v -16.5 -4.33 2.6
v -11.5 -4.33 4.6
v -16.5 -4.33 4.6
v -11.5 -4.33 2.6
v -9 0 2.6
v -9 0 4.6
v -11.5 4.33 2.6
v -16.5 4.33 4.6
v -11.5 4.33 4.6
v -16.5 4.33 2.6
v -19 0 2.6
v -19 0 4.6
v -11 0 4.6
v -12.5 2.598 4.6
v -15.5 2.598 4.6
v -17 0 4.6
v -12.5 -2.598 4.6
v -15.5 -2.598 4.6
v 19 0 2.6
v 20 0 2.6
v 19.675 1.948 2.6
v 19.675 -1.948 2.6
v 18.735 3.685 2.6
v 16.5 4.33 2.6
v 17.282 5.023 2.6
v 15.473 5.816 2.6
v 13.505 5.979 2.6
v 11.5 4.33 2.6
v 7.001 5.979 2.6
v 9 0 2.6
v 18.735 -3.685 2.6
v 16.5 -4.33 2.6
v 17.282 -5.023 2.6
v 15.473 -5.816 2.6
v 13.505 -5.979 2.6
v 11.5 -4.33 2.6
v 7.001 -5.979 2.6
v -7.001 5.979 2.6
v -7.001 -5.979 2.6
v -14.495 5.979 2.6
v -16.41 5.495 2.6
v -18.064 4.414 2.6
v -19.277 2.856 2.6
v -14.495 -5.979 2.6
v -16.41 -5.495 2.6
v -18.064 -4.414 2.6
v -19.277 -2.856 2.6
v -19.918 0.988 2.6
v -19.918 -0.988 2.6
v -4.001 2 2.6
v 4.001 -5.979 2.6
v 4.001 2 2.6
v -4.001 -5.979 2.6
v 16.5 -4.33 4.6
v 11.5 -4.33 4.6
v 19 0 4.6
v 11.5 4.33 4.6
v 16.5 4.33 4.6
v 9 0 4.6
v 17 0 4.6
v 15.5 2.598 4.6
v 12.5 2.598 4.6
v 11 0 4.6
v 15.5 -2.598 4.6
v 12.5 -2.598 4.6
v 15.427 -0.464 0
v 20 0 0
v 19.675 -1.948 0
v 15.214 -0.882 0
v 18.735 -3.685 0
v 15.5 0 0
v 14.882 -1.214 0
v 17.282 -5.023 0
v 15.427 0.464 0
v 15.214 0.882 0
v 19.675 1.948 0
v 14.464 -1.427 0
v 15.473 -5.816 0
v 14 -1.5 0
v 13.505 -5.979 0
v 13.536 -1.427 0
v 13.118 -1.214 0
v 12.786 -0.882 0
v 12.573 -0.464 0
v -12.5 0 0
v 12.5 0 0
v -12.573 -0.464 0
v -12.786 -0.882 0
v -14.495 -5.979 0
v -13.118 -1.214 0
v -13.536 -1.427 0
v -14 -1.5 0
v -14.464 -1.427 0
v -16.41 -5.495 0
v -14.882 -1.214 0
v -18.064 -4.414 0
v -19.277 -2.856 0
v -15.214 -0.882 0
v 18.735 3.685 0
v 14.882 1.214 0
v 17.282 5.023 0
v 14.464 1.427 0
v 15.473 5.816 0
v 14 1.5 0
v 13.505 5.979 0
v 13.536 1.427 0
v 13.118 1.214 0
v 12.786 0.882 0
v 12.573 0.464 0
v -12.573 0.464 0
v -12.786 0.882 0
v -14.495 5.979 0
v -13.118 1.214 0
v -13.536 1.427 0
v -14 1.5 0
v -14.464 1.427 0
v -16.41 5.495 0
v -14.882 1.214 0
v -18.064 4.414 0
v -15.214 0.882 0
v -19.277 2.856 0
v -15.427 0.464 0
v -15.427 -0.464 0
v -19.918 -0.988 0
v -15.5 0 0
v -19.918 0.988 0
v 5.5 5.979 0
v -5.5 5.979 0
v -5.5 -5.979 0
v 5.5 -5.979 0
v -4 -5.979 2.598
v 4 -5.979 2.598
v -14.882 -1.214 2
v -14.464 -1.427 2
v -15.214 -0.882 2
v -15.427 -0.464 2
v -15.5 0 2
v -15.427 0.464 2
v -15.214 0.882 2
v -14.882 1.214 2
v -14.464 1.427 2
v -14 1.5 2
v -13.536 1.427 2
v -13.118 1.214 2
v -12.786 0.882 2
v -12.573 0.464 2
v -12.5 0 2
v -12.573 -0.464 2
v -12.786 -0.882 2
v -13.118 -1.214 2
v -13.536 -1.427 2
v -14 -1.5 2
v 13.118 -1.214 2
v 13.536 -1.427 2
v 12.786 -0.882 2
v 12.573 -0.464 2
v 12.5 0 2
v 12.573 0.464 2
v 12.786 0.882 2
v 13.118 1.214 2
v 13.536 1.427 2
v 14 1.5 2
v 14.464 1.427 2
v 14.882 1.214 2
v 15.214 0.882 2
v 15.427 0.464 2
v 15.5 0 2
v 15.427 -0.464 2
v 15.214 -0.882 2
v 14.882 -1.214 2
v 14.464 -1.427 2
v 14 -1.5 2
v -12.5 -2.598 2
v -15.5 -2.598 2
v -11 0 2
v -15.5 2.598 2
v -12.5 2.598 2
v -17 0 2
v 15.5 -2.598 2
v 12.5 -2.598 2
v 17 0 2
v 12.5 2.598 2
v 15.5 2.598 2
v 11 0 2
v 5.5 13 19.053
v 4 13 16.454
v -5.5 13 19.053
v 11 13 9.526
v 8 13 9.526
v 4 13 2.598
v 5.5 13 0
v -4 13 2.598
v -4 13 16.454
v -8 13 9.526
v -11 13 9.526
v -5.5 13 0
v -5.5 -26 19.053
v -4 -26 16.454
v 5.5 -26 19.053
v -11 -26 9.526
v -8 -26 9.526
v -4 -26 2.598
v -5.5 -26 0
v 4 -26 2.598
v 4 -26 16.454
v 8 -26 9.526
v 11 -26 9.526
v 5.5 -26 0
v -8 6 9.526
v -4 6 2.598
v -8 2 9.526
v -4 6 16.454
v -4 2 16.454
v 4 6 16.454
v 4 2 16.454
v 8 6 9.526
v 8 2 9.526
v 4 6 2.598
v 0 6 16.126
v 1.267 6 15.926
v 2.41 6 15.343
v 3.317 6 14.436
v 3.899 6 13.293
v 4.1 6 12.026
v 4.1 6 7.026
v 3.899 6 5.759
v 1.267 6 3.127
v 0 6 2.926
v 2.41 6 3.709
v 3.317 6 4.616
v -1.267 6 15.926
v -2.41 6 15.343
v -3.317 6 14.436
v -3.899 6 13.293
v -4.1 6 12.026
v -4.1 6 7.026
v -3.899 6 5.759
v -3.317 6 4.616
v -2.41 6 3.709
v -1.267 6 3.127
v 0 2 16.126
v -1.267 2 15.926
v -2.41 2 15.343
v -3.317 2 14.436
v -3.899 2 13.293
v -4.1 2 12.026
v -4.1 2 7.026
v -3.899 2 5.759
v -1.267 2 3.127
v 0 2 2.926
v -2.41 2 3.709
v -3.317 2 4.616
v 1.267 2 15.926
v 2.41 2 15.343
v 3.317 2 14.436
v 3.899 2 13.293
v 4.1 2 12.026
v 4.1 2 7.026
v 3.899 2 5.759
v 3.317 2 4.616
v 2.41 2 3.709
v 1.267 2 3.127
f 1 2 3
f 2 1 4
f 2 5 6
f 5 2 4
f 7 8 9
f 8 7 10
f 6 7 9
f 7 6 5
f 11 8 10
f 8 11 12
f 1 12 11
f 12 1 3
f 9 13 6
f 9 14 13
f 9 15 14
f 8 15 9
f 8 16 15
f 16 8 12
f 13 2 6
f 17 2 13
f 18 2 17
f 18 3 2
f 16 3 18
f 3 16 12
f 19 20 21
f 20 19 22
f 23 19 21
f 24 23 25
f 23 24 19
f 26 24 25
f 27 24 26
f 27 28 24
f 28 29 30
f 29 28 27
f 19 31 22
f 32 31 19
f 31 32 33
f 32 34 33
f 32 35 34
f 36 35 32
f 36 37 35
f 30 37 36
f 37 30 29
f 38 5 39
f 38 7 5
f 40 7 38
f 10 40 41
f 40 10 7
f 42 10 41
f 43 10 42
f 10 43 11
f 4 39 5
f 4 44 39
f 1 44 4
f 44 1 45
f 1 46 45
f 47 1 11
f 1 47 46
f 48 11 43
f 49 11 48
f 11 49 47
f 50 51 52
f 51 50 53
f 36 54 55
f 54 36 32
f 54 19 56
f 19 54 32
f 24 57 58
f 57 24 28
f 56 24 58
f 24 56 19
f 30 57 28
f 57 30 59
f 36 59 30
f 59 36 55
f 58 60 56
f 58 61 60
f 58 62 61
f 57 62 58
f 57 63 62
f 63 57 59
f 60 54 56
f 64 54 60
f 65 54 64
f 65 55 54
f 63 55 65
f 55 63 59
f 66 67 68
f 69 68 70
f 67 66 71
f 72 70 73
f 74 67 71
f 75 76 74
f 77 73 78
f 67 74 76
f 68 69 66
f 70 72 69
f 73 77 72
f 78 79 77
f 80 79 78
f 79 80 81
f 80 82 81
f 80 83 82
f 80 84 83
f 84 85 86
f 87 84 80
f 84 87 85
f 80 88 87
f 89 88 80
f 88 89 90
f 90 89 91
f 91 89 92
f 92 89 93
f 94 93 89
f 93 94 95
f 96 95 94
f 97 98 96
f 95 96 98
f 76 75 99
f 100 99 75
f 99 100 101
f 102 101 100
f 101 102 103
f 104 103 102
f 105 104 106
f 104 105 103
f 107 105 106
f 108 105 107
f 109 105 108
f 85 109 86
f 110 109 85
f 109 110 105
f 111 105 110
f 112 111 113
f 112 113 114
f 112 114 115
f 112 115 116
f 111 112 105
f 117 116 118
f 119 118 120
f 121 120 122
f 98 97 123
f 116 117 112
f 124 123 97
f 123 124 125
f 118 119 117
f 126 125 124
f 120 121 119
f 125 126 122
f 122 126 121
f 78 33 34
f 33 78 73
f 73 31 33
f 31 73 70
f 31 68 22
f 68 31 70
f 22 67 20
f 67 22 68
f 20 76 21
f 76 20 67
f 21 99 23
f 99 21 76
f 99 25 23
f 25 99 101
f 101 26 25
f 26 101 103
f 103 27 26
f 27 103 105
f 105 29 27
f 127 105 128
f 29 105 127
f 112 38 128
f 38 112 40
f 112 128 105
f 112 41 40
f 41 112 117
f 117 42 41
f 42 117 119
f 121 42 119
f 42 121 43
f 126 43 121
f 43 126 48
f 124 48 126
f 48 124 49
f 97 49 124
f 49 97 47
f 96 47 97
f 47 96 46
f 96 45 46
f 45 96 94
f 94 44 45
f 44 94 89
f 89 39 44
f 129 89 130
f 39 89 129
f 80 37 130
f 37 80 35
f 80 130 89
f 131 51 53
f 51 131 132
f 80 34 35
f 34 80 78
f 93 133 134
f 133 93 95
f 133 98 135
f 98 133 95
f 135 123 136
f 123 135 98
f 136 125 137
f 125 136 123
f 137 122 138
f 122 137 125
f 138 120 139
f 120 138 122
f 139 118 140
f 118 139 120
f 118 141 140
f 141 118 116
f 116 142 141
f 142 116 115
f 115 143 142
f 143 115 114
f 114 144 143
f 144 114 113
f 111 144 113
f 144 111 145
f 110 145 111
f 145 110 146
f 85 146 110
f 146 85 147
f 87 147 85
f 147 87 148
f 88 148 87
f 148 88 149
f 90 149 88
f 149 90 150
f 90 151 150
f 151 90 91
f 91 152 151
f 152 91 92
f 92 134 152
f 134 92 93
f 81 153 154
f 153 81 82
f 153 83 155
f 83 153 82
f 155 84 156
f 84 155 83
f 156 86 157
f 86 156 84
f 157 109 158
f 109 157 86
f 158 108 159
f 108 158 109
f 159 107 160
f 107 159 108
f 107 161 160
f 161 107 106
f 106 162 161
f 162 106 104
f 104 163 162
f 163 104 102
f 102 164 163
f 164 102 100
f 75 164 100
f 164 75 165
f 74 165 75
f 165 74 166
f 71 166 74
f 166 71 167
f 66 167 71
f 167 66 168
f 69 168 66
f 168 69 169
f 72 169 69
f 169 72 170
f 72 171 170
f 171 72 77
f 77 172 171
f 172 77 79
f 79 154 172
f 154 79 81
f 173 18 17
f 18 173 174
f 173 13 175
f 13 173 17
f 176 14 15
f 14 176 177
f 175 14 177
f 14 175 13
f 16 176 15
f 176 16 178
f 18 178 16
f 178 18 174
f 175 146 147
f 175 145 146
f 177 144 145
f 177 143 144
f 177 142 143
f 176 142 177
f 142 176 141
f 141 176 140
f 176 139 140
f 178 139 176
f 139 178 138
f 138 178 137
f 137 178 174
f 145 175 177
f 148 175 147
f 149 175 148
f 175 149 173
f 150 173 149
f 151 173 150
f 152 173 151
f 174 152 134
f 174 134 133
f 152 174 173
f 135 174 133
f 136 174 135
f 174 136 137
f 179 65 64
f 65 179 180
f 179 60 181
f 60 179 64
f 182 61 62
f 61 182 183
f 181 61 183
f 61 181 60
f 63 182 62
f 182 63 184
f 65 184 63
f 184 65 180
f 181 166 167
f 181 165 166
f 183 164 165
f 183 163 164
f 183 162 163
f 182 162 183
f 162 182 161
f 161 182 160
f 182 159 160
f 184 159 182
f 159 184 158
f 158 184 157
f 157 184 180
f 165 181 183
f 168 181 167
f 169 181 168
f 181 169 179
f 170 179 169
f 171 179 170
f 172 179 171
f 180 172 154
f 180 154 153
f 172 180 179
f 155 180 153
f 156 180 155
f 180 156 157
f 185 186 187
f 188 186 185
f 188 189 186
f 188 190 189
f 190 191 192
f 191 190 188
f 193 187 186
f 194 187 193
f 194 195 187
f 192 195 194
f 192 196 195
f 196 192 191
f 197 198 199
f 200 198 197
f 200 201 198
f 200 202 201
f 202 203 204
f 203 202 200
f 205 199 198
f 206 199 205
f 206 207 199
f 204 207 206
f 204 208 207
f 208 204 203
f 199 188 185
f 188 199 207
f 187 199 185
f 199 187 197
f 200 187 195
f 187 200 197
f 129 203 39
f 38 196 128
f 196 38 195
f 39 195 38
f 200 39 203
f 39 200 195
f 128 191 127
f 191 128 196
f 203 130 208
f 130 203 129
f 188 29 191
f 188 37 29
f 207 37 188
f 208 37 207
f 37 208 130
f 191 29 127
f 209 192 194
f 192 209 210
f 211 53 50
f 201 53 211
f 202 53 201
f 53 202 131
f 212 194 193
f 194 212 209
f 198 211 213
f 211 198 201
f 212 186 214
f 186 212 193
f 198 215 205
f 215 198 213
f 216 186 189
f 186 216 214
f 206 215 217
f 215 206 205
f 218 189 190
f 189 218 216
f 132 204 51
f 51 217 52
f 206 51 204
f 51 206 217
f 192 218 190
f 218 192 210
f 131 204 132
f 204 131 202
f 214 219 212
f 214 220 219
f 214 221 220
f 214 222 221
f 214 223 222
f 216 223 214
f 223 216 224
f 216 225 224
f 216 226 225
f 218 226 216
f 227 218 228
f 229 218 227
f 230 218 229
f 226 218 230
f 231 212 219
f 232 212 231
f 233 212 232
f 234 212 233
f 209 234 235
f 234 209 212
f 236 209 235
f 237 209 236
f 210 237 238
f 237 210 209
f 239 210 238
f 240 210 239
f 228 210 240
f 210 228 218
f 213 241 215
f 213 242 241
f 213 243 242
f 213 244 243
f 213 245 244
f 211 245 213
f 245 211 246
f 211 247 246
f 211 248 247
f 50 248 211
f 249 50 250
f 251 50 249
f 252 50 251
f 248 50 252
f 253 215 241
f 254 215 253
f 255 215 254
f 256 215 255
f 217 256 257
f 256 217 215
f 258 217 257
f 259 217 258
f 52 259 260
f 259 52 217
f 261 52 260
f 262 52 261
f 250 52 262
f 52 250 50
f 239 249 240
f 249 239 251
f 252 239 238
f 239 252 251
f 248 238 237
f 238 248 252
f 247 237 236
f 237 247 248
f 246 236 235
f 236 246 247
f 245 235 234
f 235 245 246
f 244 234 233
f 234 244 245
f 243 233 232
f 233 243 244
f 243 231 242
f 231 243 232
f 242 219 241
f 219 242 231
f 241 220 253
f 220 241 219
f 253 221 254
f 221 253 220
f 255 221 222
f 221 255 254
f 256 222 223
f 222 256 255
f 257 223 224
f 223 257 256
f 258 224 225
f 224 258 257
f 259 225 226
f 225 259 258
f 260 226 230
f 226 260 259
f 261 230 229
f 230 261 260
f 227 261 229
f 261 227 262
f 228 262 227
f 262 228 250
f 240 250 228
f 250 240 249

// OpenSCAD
// file: ZLink-params.scad
dx_z_threaded = 14;
ZLink_rod_height = 11*sqrt(3)/2;
Zlink_hole_height = (XPlatform_height-thickness)/3;
// file: Metamaquina-config.scad
/*Thickness of acrylic or plywood sheets to use.*/
thickness = 6; //millimiters

/*This value is added to the thickness value when drawing cuts for connecting perpendicular sheets together*/
slot_extra_thickness = 0.5;

module TSlot_holes(width=50){
  t_slot_holes(width=width, thickness=thickness+slot_extra_thickness);
}

module TSlot_joints(width=50){
  t_slot_joints(width=width, thickness=thickness, joint_size=5);
}

/*z motor placement in the original Prusa was on top. Our design uses the z motors in the bottom of the machine, but if you want them on top, you can set this variable to true. */
zmotors_on_top = false;

/* Desired build volume: */
BuildVolume_X=200;
BuildVolume_Y=200;
BuildVolume_Z=150;

//rendering configs:
preview_lasercut=true;
preview_pcb=true;
preview_ABS=true;
preview_PLA=true;
preview_metal=true;
preview_threaded_metal=true;
preview_rubber=true;
preview_nozzle=true;
preview_peek=true;
preview_powersupply=true;

render_calibration_guide = false;
render_build_volume=false;
render_xplatform=true;
render_bolts = false; //work-in-progress

//Colors
rubber_color = [0.1, 0.1, 0.1];
nozzle_color = "gold";
pcb_color = [1.0, 0.0, 0.0];
threaded_metal_color = [0.6, 0.6, 0.6];
metal_color = [0.7, 0.7, 0.7];
powersupply_color = metal_color;
PLA_color = [0.95, 0.35, 0.35];
ABS_color = [0.95, 0.95, 0.85];
//sheet_color = [0.95, 0.8, 0.65];
sheet_color = [0.9, 0.3, 0.3, 1];
peek_color = "beige";
dark_grey = [0.3, 0.3, 0.3];

epsilon=0.1;
inch=25.4;
m3_diameter = 3;
m4_diameter = 4;
m8_diameter = 8;

//-------------------------
//RepRap standards:

X_rods_distance = 50;
X_rods_diameter=8;
z_rod_z_bar_distance = 30;
Y_rods_distance = 140;

//-------------------------
extruder_mount_holes_distance = X_rods_distance + 14;
microswitch_holes_distance = 10; //TODO: measure this.

XPlatform_height = 45;
// main file
// z_threaded_bar_link (a.k.a. z-link)
//
// These are the plastic parts that link the XPlatform to the 
// Z-axis threaded bars.
//
// (c) 2013 Felipe C. da S. Sanches <fsanches@metamaquina.com.br>
// Licensed under the terms of the GNU General Public License
// version 3 (or later).

include <Metamaquina-config.scad>;
include <ZLink-params.scad>;

module ZLink(clearance = 0.2){
  if (preview_ABS){
    color(ABS_color){
      difference(){
        union(){
          linear_extrude(height=2.6){
	          difference(){
		          hull(){
                for (i=[-1,1])
        			    translate([i*dx_z_threaded, 0])
        			    circle(r=6);
		          }
              for (i=[-1,1])
		            translate([i*dx_z_threaded, 0])
		            circle(r=m3_diameter/2, $fn=20);
	          }
          }
          for (i=[-1,1])
        		translate([i*dx_z_threaded, 0, 2.6]) cylinder(r=5, h=2, $fn=6);
        }

        for (i=[-1,1])
          translate([i*dx_z_threaded, 0, 2]) cylinder(r=3, h=5, $fn=6);
      }

      translate([0,Zlink_hole_height, ZLink_rod_height])
      rotate([90, 0, 0]){
        linear_extrude(height=XPlatform_height - thickness)
        difference(){
	        circle($fn=6, r=11);
	        circle($fn=6, r=8);
        }

        translate([0,0,7]){
	        linear_extrude(height=4)
	        difference(){
		        circle($fn=6, r=10);
			    hull(){
				    for (i=[-1,1])
				    translate([0,i*2.5])
			        circle($fn=20, r=(8+clearance)/2);
			    }
	        }
        }
      }
    }
  }
}

ZLink();
